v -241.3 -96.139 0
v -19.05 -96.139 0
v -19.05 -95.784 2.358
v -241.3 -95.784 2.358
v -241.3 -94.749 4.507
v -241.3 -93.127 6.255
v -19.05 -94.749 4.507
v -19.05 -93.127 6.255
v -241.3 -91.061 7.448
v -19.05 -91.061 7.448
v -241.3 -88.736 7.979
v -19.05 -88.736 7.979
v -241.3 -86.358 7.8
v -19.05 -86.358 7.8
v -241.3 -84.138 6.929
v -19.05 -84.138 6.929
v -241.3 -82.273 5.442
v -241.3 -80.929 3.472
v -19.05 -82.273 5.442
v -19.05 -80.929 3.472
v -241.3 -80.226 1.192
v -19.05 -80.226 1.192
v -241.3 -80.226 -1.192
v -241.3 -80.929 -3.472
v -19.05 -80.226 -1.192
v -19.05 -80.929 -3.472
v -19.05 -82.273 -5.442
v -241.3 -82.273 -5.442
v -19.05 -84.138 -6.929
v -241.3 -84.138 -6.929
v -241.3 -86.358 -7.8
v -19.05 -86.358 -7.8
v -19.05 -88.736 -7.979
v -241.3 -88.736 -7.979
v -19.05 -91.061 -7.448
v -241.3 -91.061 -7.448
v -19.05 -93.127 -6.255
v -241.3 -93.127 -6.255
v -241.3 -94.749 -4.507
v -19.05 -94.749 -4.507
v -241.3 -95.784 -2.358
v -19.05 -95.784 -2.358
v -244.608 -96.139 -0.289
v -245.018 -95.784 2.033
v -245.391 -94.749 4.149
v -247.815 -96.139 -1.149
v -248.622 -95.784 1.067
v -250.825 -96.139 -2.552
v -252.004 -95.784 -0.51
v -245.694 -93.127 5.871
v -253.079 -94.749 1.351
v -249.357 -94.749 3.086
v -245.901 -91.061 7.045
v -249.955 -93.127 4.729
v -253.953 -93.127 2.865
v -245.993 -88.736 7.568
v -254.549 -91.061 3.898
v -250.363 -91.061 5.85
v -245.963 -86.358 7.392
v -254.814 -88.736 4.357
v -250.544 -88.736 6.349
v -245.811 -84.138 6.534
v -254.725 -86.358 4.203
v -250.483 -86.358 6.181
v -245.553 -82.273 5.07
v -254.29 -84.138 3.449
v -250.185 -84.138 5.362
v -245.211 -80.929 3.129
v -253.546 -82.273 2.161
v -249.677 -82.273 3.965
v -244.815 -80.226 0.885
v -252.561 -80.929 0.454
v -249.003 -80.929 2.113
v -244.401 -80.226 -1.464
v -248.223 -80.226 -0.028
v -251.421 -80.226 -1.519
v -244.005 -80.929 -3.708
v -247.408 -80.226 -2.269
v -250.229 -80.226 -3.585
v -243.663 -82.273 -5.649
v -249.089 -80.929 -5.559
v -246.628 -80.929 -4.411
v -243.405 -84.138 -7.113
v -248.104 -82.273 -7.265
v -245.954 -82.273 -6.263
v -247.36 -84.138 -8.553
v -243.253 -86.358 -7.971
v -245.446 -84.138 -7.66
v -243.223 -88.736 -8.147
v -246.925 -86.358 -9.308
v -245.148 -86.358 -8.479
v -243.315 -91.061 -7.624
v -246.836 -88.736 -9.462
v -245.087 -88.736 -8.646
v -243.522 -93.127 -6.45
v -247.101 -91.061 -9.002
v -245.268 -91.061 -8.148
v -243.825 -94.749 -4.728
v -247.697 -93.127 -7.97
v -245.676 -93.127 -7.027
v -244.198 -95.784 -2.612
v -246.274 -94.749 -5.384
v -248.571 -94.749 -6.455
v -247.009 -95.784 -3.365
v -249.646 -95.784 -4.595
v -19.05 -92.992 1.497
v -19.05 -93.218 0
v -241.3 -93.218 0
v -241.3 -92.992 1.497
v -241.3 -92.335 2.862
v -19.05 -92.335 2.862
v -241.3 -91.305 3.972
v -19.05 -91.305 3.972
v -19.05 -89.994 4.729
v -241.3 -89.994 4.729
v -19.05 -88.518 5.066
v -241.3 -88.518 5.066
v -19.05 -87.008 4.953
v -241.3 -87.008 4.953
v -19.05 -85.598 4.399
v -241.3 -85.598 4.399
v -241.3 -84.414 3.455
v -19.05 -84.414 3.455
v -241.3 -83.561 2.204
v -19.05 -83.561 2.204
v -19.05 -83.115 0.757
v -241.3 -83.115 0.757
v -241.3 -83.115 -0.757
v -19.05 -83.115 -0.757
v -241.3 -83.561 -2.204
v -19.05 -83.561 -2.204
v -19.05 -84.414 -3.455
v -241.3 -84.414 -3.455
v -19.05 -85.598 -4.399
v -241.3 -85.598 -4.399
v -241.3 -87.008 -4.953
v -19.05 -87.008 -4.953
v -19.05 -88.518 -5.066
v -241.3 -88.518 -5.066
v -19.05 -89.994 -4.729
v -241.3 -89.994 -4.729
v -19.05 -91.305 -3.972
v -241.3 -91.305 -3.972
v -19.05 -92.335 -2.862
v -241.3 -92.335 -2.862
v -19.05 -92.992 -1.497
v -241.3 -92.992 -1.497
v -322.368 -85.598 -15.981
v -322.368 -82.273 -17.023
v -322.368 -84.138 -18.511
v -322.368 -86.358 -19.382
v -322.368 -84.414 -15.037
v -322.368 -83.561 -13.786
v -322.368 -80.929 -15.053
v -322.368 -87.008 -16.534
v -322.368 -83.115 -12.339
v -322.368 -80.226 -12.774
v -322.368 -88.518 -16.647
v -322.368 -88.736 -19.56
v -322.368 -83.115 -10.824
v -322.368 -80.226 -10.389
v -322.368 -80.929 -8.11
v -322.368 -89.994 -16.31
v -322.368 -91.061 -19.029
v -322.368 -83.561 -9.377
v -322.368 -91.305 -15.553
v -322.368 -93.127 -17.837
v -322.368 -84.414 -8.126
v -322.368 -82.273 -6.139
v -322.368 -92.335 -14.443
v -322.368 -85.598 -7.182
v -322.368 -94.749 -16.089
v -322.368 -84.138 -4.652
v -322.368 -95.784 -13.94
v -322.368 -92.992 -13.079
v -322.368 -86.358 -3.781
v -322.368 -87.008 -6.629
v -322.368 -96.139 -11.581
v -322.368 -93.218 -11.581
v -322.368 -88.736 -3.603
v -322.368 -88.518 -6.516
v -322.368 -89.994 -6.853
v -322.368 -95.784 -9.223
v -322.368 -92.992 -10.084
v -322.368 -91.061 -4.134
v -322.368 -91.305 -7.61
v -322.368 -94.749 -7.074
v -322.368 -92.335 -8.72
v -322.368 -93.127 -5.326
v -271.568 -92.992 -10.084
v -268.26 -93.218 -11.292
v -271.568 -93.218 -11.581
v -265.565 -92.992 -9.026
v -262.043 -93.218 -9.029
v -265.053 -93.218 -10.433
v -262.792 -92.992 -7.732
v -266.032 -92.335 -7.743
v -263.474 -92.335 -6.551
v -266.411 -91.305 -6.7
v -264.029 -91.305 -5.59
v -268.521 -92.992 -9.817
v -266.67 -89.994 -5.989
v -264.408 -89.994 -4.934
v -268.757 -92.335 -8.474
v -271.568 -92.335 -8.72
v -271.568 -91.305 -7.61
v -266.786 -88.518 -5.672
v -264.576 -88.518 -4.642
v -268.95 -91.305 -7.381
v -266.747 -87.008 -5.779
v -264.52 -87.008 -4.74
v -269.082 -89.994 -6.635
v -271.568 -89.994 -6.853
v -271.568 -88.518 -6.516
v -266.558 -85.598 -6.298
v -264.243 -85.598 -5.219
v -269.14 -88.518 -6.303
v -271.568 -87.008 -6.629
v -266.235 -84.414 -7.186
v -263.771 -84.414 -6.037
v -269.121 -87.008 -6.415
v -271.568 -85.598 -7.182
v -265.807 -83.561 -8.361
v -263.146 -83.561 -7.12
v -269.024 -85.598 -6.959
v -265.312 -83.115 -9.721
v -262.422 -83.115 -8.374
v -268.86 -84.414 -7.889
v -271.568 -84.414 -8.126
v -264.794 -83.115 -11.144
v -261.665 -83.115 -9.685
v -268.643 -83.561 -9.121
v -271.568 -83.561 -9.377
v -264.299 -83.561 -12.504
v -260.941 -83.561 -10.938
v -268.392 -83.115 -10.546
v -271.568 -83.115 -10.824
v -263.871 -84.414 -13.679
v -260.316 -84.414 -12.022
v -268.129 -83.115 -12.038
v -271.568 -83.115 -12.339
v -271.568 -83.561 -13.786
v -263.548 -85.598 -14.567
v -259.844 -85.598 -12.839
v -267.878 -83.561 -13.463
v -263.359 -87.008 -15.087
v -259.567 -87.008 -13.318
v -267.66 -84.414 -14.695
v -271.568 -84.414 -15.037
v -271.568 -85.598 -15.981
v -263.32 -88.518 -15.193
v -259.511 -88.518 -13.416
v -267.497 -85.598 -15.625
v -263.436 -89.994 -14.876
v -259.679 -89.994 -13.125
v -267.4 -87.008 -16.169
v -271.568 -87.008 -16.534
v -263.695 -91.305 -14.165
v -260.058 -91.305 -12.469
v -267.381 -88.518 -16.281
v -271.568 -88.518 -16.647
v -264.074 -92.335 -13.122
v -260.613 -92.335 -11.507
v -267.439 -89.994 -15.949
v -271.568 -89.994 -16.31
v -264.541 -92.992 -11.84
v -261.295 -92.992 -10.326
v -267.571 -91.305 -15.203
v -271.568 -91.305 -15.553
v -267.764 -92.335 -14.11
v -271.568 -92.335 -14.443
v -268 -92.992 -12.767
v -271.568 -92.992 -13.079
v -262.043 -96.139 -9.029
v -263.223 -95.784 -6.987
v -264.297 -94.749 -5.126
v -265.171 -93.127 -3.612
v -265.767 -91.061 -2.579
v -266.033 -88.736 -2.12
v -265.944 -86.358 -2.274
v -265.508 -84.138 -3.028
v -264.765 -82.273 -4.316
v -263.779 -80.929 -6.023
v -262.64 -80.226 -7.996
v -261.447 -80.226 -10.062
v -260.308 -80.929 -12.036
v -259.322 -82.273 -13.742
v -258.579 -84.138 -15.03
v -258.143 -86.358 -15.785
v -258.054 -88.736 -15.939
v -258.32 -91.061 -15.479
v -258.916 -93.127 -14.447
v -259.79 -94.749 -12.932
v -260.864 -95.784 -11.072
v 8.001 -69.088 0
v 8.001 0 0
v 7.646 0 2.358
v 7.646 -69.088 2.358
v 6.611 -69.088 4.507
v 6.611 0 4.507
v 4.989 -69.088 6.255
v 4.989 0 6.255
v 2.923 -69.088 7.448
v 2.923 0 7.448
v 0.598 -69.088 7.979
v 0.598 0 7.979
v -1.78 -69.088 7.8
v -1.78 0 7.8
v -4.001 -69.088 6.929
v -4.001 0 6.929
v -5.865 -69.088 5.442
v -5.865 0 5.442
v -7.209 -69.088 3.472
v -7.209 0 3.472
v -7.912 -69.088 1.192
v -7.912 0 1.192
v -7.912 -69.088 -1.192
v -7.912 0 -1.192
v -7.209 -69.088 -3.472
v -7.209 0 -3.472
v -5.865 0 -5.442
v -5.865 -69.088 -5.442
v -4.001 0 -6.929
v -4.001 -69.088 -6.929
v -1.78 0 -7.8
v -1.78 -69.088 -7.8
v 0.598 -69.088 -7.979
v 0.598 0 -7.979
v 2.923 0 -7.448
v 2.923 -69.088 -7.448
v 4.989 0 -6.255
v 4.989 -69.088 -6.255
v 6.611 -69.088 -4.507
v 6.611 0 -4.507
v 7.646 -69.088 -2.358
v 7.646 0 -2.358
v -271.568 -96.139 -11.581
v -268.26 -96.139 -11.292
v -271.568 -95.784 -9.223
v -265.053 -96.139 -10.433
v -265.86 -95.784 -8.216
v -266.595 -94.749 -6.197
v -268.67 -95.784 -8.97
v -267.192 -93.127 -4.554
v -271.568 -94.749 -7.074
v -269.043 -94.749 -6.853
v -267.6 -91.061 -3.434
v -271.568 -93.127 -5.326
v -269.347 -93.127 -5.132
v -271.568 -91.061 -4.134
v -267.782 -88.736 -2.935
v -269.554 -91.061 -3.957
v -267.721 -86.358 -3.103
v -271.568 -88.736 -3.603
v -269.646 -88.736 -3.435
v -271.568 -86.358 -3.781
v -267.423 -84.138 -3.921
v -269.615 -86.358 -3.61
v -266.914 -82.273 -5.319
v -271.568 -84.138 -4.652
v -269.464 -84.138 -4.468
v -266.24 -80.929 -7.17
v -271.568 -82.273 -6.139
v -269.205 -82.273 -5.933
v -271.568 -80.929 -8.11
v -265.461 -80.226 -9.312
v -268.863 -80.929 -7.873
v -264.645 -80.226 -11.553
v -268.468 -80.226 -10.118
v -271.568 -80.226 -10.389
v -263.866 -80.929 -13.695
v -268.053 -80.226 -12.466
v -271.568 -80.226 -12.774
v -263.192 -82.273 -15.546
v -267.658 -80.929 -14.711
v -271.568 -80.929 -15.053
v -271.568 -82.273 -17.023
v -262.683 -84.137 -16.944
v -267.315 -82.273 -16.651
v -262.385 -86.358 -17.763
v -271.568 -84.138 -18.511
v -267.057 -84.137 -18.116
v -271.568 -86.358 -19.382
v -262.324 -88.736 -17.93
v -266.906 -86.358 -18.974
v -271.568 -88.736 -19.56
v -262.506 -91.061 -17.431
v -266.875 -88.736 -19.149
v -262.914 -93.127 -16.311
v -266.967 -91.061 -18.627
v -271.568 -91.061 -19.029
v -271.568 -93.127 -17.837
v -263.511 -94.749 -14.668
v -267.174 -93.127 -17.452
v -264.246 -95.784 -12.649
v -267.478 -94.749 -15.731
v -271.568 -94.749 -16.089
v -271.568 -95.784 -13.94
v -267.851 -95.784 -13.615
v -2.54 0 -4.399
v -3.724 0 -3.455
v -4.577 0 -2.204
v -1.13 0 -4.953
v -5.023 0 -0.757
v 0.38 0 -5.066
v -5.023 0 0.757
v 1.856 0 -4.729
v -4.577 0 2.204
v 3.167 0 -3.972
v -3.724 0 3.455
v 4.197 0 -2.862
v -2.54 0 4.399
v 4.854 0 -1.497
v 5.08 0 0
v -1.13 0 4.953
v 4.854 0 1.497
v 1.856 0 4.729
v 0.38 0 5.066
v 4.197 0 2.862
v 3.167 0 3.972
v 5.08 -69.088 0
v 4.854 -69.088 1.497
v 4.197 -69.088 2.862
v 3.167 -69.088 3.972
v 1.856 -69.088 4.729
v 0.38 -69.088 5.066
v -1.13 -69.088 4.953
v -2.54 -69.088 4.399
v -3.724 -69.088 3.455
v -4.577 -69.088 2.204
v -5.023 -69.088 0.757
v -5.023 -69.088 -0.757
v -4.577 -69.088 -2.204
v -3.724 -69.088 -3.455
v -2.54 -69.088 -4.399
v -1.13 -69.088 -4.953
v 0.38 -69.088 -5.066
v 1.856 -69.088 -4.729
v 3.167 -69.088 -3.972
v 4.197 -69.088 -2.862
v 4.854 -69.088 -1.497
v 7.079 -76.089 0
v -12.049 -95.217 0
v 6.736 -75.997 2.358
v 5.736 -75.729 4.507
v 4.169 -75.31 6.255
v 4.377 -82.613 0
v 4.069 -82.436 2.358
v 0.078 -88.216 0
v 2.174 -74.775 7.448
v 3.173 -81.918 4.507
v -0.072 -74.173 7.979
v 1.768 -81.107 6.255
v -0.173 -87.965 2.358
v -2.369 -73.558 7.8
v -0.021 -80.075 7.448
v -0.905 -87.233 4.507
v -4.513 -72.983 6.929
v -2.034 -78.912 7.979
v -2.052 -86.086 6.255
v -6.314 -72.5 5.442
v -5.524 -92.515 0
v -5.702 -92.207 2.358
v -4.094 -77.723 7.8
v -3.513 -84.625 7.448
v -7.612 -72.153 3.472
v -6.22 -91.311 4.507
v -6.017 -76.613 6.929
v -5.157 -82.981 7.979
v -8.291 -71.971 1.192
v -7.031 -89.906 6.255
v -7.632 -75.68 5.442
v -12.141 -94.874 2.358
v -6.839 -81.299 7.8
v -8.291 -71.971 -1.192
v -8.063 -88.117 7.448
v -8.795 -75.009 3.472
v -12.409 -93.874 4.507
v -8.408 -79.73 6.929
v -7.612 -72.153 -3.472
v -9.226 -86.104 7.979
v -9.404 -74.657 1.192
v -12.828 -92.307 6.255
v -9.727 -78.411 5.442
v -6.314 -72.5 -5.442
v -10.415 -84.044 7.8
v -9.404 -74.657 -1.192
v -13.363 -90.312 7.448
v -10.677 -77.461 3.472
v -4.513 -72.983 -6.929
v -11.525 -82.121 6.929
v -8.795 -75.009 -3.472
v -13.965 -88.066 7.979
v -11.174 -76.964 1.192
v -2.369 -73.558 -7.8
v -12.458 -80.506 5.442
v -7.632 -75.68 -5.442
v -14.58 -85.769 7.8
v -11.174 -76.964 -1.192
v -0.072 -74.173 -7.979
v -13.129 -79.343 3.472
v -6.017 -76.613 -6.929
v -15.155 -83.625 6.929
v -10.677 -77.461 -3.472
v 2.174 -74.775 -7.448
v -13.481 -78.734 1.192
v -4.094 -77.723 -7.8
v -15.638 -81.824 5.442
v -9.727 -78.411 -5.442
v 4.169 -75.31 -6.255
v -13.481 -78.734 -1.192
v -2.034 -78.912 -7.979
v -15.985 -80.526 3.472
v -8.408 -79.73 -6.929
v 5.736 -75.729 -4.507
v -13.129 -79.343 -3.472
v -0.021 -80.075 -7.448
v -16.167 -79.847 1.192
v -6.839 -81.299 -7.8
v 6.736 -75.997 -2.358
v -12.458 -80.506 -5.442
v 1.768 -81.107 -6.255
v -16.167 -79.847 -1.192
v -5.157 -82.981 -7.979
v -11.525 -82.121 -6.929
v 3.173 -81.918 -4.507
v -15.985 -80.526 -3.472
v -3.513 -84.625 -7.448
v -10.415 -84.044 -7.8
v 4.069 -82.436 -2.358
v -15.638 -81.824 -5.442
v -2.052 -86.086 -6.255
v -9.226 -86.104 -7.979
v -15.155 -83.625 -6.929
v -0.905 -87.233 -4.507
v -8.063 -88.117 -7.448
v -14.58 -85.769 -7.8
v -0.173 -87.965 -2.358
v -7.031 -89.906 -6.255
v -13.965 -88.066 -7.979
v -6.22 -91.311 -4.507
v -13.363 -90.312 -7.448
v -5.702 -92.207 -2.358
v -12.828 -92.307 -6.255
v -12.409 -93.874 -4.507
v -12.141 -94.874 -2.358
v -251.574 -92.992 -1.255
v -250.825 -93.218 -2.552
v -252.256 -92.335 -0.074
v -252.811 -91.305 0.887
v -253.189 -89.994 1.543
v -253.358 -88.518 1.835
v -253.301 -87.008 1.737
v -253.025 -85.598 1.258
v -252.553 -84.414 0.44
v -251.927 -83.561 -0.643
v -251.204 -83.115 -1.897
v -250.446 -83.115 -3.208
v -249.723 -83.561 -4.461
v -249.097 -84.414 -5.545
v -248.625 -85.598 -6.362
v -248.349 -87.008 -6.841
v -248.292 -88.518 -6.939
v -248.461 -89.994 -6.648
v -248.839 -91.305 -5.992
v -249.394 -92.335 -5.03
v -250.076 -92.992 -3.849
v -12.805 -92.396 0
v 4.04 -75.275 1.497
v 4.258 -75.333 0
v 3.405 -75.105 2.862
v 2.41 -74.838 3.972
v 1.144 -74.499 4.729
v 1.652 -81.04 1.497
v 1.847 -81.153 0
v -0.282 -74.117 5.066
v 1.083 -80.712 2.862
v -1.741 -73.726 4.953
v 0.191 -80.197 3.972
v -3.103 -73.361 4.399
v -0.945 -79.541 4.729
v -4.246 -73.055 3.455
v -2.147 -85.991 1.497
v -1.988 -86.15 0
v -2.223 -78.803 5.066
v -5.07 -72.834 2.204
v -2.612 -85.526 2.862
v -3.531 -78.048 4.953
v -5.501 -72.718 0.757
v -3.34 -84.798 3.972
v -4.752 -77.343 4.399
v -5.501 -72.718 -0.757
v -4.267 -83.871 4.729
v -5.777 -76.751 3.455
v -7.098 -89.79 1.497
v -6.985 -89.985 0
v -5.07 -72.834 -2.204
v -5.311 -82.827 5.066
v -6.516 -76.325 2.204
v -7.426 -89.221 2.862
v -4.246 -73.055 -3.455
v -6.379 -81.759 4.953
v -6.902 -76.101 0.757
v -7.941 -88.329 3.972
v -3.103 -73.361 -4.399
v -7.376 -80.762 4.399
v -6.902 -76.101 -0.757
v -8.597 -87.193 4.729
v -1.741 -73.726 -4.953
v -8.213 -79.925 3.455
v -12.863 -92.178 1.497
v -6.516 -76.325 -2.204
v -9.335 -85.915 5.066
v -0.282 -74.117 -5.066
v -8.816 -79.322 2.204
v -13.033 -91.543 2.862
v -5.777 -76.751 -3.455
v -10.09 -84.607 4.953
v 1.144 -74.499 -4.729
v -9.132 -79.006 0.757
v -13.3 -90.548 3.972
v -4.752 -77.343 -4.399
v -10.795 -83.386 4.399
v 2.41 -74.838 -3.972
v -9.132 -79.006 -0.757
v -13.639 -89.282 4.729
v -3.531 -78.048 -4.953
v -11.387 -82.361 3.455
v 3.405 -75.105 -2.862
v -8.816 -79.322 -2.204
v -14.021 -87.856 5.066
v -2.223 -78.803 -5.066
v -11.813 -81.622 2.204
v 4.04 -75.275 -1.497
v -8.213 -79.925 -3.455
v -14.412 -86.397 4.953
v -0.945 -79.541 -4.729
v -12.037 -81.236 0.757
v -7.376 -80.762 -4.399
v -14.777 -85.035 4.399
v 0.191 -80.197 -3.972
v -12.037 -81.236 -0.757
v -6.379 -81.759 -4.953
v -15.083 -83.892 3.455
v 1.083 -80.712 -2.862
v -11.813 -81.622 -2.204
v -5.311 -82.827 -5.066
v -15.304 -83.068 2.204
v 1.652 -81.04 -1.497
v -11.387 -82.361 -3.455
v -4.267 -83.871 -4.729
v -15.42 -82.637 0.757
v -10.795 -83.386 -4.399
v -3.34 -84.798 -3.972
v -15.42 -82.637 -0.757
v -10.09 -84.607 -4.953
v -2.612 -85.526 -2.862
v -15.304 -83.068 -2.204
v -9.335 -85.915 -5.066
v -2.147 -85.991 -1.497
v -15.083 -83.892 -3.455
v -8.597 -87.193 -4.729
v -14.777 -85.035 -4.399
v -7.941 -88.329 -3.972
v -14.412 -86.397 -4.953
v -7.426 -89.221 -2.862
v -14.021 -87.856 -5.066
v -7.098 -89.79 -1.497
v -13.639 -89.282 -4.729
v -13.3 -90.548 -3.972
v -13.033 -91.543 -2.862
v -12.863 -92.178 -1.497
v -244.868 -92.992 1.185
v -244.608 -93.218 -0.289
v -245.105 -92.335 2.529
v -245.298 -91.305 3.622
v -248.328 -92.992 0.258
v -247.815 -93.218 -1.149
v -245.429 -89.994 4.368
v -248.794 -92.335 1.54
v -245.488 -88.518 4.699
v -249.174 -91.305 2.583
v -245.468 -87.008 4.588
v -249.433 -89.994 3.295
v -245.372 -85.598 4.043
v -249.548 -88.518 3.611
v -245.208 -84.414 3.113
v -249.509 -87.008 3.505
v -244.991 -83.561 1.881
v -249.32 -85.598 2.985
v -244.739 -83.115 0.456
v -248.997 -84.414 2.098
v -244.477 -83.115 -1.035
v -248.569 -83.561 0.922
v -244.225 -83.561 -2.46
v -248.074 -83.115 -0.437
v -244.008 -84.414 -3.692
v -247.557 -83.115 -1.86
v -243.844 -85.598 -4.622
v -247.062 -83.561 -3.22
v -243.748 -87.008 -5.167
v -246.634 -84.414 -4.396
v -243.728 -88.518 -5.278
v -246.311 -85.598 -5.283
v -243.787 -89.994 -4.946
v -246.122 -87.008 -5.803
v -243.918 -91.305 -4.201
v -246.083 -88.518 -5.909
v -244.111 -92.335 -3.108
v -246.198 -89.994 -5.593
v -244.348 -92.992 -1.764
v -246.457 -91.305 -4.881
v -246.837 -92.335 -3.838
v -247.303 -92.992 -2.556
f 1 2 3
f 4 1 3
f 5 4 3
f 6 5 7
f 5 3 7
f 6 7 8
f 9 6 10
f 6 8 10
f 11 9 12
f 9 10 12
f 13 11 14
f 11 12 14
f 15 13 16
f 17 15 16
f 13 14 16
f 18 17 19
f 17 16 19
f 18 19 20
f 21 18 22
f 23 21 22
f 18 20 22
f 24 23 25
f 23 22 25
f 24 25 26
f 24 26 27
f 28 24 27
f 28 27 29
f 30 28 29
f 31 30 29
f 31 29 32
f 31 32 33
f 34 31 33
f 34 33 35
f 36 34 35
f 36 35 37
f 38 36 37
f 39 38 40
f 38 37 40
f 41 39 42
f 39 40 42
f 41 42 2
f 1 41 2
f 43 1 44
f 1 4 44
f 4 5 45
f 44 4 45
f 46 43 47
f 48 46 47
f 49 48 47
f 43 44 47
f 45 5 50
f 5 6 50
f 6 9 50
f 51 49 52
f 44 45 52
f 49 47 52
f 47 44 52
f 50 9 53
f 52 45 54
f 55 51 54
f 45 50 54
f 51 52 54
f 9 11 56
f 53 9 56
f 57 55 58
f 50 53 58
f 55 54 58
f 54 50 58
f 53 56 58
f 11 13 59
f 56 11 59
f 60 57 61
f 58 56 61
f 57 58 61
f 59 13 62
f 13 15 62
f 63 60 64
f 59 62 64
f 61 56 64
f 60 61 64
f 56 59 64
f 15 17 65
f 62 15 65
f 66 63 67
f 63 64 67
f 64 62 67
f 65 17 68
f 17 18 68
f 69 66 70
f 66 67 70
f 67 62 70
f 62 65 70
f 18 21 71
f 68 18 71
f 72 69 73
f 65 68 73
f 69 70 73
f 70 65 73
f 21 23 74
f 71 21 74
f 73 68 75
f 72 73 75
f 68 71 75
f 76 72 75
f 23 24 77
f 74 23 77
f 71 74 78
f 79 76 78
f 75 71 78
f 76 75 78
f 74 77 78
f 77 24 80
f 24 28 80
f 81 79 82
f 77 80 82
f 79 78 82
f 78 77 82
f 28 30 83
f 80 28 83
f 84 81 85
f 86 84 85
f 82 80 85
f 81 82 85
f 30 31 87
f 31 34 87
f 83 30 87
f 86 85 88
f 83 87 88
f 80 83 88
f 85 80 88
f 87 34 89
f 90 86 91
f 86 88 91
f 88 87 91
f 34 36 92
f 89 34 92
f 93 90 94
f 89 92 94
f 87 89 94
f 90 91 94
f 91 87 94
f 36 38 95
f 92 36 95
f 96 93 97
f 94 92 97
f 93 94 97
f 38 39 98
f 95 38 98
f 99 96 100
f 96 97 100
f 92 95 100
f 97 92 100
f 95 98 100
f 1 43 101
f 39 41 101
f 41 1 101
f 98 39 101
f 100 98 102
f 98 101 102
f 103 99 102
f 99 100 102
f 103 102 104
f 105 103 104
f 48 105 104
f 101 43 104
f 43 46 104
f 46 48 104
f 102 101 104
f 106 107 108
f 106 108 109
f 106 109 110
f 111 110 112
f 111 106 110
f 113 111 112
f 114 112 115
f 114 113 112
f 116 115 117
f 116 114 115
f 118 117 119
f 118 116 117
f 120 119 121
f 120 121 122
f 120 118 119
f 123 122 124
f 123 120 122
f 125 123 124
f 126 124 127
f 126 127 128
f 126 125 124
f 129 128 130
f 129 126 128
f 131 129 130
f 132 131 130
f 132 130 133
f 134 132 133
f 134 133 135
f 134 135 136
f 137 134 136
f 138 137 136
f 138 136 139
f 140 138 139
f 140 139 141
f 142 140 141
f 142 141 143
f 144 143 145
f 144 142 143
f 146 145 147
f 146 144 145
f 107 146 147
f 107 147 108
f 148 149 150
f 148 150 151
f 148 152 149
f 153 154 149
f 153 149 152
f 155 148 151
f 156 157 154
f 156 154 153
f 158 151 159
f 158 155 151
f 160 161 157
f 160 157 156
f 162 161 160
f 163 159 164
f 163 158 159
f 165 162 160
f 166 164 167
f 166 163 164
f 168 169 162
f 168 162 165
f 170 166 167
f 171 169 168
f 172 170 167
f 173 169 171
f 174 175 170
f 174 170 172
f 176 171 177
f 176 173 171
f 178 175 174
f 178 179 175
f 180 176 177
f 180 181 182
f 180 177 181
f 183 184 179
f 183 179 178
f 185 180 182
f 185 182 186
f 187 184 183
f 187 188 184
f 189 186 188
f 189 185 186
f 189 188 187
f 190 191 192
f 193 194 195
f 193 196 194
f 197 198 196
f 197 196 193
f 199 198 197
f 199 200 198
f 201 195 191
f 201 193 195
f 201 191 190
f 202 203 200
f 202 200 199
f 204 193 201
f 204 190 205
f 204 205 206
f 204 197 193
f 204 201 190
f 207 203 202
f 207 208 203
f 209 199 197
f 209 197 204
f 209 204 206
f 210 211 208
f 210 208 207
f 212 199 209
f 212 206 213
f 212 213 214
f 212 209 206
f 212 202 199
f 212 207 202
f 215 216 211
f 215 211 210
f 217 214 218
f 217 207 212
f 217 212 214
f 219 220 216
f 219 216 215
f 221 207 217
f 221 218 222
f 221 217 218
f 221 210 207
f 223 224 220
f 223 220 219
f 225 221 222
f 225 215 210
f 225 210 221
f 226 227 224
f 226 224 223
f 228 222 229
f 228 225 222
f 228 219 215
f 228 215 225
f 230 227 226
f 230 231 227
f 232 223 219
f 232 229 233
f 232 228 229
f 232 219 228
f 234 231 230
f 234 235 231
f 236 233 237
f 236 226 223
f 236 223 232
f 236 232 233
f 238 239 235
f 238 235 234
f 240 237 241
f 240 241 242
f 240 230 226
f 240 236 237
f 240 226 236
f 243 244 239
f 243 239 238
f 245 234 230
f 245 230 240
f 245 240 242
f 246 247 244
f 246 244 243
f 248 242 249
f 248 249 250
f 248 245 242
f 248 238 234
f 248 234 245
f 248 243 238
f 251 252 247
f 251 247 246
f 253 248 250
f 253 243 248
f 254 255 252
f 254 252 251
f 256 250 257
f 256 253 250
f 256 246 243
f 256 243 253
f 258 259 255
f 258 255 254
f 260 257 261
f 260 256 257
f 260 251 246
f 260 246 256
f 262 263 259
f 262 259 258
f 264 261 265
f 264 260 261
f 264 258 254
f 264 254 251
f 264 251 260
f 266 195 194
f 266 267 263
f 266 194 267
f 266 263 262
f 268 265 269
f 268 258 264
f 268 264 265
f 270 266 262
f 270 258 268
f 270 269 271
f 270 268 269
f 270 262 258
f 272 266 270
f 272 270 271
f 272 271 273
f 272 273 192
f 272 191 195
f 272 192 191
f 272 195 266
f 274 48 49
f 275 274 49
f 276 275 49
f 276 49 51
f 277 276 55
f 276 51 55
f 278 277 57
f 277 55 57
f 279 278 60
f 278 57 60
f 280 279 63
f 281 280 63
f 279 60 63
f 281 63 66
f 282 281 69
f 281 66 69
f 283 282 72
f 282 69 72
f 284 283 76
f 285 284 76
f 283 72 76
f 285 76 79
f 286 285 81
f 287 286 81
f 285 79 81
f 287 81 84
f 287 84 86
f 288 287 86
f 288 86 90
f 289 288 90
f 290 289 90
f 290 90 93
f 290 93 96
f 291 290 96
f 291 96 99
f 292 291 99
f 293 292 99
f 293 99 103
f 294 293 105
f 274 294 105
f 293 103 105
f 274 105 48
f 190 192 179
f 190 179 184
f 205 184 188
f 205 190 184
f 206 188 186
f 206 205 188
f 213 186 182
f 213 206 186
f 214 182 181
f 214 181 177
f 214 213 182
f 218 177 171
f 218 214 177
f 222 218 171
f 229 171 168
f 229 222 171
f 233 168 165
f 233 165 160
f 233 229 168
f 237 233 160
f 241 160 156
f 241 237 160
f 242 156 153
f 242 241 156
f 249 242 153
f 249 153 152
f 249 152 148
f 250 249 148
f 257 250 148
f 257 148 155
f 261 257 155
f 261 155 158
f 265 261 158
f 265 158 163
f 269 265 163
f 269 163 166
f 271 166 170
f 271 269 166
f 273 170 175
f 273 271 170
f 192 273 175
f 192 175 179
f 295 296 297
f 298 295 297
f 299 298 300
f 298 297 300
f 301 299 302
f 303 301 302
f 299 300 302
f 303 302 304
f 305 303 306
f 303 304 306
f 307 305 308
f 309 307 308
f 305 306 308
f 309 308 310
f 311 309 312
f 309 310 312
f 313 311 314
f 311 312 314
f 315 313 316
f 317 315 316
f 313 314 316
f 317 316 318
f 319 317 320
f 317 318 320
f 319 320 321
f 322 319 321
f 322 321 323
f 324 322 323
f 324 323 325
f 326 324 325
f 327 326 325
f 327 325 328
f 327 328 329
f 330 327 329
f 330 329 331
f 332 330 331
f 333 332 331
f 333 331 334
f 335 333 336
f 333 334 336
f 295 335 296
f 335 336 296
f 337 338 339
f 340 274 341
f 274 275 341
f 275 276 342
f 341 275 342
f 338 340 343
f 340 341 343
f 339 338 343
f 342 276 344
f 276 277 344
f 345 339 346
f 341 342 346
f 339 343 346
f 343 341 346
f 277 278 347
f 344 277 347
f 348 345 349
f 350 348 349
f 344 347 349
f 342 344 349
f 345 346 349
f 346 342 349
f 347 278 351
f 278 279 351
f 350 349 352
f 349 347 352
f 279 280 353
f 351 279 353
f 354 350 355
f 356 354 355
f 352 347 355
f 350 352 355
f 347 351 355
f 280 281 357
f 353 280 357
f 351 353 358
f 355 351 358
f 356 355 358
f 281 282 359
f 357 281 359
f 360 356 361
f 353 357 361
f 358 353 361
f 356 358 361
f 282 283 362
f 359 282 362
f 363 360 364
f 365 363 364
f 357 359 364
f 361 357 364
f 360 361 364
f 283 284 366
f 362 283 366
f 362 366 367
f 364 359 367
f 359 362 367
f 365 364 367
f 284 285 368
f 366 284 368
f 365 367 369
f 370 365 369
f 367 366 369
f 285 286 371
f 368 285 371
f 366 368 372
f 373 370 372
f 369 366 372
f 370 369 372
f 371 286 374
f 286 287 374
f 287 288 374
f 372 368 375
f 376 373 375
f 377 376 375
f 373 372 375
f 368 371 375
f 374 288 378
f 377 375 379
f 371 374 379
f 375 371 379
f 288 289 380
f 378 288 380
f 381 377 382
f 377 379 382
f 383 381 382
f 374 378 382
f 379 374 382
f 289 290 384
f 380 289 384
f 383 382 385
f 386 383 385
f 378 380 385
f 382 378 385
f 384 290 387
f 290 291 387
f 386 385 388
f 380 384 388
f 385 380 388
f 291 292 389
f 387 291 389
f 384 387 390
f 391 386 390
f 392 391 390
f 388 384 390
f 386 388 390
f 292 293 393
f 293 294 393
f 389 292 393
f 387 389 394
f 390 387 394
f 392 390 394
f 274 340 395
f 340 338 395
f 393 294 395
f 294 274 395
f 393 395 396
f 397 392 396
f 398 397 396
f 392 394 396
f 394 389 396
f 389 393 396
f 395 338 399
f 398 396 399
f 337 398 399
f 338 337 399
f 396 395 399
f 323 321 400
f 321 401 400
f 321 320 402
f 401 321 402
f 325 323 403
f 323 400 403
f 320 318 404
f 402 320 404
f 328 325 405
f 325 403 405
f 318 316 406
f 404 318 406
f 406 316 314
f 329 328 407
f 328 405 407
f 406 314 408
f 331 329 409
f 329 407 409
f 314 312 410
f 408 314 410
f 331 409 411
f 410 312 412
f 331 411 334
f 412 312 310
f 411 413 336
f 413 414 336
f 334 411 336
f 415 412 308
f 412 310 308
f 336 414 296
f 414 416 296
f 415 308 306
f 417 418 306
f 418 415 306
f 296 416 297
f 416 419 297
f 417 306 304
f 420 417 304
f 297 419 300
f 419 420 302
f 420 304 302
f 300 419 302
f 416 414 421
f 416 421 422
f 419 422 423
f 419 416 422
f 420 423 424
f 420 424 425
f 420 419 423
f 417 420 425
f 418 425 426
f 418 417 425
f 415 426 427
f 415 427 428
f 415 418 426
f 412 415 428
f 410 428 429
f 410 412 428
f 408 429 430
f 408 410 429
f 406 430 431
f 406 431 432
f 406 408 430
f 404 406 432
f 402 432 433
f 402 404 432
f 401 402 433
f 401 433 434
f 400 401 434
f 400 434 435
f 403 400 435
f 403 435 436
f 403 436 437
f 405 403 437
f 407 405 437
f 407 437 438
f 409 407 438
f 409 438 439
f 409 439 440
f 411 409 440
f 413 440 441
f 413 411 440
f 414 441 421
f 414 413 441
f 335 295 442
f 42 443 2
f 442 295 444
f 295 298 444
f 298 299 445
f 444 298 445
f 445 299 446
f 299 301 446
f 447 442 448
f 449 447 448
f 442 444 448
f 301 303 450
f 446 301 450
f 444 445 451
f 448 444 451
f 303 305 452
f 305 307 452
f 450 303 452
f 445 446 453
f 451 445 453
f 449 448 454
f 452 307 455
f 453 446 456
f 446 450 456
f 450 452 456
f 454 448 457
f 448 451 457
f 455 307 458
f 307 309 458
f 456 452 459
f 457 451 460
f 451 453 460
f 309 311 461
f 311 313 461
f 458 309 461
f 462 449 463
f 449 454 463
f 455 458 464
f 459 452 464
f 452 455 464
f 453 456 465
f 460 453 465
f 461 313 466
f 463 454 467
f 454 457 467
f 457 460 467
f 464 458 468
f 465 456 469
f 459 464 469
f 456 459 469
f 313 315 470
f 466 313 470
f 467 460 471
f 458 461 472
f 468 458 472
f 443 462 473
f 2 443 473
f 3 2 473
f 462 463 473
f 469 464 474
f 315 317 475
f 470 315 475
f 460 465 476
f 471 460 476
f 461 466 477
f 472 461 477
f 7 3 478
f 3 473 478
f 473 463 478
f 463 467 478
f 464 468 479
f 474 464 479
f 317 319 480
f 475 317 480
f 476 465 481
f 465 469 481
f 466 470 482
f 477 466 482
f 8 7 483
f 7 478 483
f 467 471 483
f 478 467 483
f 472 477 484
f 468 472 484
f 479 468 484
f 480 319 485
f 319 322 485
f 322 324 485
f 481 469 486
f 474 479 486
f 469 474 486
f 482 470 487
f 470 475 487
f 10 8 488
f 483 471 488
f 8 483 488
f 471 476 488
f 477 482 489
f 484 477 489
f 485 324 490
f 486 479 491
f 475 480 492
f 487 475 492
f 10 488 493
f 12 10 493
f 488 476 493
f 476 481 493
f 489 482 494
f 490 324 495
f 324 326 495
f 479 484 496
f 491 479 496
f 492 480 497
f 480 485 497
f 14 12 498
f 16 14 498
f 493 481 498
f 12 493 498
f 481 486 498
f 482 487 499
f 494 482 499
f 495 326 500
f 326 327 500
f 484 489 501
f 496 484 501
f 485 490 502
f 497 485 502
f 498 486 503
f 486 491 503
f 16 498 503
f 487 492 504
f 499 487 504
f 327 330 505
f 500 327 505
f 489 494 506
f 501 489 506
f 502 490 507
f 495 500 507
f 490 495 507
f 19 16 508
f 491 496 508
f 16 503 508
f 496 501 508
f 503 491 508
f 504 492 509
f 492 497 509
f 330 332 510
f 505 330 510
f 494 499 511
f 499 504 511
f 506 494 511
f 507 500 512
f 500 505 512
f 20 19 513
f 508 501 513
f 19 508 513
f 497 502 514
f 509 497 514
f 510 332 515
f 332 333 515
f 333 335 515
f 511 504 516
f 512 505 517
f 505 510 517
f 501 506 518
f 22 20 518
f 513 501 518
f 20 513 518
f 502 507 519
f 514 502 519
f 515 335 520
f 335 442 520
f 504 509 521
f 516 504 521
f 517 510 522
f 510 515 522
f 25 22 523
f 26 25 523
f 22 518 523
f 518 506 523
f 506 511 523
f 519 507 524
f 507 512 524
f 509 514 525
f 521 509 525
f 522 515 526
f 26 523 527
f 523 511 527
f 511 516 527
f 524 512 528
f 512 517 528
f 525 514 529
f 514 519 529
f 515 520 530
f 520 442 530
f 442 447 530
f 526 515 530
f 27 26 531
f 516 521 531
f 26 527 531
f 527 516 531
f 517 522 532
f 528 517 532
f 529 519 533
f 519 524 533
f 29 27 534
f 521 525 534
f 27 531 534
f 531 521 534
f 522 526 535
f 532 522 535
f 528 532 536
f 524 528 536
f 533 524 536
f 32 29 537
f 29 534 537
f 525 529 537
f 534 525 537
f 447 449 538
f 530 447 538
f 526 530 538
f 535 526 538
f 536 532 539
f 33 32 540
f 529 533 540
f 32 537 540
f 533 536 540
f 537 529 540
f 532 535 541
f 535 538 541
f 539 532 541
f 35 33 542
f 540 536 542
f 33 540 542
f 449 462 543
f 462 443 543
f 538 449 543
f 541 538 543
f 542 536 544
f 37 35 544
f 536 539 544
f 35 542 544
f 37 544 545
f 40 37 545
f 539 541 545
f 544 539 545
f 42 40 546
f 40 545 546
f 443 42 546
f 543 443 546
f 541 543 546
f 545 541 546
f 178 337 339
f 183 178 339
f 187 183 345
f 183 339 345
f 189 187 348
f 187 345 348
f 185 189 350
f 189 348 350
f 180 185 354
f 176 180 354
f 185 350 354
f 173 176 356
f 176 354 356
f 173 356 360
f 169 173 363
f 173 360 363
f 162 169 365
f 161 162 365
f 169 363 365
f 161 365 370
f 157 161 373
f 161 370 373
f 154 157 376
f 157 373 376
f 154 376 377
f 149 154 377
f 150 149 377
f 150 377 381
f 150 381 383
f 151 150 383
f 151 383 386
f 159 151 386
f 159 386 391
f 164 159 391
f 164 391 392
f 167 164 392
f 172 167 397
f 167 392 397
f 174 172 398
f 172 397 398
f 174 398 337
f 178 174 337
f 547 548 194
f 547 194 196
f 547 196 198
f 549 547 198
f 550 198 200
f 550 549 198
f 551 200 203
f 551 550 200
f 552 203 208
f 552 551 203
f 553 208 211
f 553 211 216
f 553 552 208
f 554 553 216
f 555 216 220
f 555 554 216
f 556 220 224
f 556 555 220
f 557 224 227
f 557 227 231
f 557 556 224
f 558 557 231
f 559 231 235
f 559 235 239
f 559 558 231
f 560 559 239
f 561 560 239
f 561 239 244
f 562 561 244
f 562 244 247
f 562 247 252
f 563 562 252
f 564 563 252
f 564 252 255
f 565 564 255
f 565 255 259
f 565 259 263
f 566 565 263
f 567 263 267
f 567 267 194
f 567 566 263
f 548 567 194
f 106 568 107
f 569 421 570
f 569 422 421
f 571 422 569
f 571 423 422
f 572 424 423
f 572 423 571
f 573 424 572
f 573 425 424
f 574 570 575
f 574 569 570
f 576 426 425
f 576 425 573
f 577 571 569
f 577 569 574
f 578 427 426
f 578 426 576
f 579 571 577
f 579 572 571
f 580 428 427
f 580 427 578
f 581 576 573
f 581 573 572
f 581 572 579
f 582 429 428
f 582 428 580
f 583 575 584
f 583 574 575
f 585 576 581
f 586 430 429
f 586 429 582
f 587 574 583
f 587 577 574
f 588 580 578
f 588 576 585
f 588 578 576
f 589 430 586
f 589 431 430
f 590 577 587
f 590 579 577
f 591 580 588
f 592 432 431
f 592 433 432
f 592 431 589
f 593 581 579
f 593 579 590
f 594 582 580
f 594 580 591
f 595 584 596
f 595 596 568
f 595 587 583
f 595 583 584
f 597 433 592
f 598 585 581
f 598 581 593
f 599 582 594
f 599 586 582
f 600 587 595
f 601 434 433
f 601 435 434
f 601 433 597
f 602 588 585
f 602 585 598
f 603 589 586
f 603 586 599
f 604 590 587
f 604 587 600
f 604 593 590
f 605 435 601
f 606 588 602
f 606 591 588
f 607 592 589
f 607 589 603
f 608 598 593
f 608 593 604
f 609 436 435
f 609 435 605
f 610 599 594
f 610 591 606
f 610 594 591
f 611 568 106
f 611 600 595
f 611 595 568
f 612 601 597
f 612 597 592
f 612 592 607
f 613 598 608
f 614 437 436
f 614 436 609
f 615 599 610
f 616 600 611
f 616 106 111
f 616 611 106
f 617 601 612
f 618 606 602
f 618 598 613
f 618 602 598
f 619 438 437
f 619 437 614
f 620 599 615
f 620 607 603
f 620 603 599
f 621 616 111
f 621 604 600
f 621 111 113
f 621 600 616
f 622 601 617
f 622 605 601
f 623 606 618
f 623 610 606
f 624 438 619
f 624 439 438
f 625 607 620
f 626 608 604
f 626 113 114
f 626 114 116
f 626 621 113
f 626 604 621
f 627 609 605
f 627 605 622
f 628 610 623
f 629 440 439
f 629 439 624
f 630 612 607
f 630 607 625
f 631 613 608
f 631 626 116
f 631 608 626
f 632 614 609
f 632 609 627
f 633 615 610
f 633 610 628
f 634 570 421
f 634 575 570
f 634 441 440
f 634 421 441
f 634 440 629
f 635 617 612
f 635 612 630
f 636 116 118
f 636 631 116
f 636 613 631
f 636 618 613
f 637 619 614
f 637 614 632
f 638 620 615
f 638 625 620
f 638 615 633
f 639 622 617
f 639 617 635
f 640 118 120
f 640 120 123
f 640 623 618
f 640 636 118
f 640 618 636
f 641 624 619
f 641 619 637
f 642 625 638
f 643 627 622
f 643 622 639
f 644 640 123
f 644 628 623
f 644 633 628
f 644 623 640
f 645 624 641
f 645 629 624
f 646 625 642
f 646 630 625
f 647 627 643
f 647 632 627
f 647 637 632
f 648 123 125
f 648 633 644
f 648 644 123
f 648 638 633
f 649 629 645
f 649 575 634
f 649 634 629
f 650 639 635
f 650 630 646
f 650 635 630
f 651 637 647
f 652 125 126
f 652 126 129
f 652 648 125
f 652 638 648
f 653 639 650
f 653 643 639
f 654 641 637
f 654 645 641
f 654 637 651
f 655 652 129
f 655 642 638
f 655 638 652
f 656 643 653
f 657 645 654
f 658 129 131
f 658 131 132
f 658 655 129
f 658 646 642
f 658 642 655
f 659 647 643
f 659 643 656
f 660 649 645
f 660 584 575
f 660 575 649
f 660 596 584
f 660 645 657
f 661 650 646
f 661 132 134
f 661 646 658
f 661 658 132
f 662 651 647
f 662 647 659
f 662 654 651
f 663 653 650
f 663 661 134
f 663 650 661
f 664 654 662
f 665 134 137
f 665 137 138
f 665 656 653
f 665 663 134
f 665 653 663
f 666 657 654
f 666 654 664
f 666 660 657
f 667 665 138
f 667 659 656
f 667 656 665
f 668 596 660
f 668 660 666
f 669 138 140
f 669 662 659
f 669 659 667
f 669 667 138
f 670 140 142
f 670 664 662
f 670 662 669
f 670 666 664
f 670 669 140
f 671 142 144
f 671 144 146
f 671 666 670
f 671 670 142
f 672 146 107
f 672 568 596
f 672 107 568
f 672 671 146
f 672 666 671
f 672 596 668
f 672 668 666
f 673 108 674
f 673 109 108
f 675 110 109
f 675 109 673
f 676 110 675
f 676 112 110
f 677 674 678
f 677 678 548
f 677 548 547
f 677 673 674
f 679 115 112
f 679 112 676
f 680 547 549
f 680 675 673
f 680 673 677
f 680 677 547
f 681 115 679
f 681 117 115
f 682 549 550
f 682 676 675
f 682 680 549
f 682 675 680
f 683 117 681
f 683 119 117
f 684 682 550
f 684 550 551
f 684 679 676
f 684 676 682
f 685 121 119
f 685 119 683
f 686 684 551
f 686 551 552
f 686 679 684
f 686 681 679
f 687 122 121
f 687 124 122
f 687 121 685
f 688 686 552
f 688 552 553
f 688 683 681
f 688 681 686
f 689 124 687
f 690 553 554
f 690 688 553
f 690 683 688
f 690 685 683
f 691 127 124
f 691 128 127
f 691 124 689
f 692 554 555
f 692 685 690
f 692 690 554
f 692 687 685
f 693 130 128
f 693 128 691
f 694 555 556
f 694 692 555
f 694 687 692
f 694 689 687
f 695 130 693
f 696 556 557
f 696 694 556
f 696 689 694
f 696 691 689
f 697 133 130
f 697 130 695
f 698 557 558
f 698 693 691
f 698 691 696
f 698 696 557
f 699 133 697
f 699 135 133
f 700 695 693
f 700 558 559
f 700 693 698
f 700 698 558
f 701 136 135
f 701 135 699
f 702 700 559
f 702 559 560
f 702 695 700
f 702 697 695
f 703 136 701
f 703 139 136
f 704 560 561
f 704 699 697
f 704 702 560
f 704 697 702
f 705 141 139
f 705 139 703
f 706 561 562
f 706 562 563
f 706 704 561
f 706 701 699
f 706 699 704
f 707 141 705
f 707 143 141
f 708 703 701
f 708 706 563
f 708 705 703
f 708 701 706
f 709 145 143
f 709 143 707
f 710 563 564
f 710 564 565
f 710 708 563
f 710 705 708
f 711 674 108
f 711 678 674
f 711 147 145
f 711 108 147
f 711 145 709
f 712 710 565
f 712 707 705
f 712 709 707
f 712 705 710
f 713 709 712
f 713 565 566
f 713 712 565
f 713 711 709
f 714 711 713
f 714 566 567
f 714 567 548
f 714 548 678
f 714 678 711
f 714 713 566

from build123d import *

# Parameters (mm, degrees)
F0_R      = 8.001
F0_R_2    = 5.08
F1_DEPTH  = 69.088
F2_R      = 8.001
F2_R_2    = 5.08
F3_ANGLE  = 90
F4_R      = 8.001
F4_R_2    = 5.08
F5_DEPTH  = 222.25
F6_R      = 8.001
F6_R_2    = 5.08
F7_ANGLE  = 30
F8_R      = 8.001
F8_R_2    = 5.08
F9_DEPTH  = 12.954
F10_R     = 8.001
F10_R_2   = 5.08
F11_ANGLE = 30
F12_R     = 8.001
F12_R_2   = 5.08
F13_DEPTH = 50.8


with BuildPart() as f1:
    # F0 (on Front) → F1 (new body)
    with BuildSketch(Plane.XZ):
        Circle(F0_R)
        Circle(F0_R_2, mode=Mode.SUBTRACT)
    extrude(amount=F1_DEPTH)

    # F2 (on face) → F3 (revolve)
    with BuildSketch(Plane.XZ.offset(69.088)):
        Circle(F2_R)
        Circle(F2_R_2, mode=Mode.SUBTRACT)
    revolve(axis=Axis((-19.05, -69.088, 2.9448331334), (0, 0, -1)), revolution_arc=F3_ANGLE)

    # F4 (on face) → F5 (join)
    with BuildSketch(Plane(origin=(-19.05, 0, 0), x_dir=(0, -1, 0), z_dir=(-1, 0, 0))):
        with Locations((88.138, 0)):
            Circle(F4_R)
        with Locations((88.138, 0)):
            Circle(F4_R_2, mode=Mode.SUBTRACT)
    extrude(amount=F5_DEPTH)

    # F6 (on face) → F7 (revolve)
    with BuildSketch(Plane(origin=(-241.3, 0, 0), x_dir=(0, -1, 0), z_dir=(-1, 0, 0))):
        with Locations((88.138, 0)):
            Circle(F6_R)
        with Locations((88.138, 0)):
            Circle(F6_R_2, mode=Mode.SUBTRACT)
    revolve(axis=Axis((-241.3, -89.2251888638, -19.05), (0, -1, 0)), revolution_arc=F7_ANGLE)

    # F8 (on face) → F9 (join)
    with BuildSketch(Plane(origin=(-189.223891971, 0, -109.2484649666), x_dir=(0, -1, 0), z_dir=(-0.8660254038, 0, -0.5))):
        with Locations((88.138, 123.2022160579)):
            Circle(F8_R)
        with Locations((88.138, 123.2022160579)):
            Circle(F8_R_2, mode=Mode.SUBTRACT)
    extrude(amount=F9_DEPTH)

    # F10 (on face) → F11 (revolve)
    with BuildSketch(Plane(origin=(-200.4423850517, 0, -115.7254649666), x_dir=(0, -1, 0), z_dir=(-0.8660254038, 0, -0.5))):
        with Locations((88.138, 123.2022160579)):
            Circle(F10_R)
        with Locations((88.138, 123.2022160579)):
            Circle(F10_R_2, mode=Mode.SUBTRACT)
    revolve(axis=Axis((-271.5684930806, -88.2795984273, 7.4685678842), (0, 1, 0)), revolution_arc=F11_ANGLE)

    # F12 (on face) → F13 (join)
    with BuildSketch(Plane(origin=(-271.5684930806, 0, 0), x_dir=(0, -1, 0), z_dir=(-1, 0, 0))):
        with Locations((88.138, -11.5814321158)):
            Circle(F12_R)
        with Locations((88.138, -11.5814321158)):
            Circle(F12_R_2, mode=Mode.SUBTRACT)
    extrude(amount=F13_DEPTH)


solid = f1.part
